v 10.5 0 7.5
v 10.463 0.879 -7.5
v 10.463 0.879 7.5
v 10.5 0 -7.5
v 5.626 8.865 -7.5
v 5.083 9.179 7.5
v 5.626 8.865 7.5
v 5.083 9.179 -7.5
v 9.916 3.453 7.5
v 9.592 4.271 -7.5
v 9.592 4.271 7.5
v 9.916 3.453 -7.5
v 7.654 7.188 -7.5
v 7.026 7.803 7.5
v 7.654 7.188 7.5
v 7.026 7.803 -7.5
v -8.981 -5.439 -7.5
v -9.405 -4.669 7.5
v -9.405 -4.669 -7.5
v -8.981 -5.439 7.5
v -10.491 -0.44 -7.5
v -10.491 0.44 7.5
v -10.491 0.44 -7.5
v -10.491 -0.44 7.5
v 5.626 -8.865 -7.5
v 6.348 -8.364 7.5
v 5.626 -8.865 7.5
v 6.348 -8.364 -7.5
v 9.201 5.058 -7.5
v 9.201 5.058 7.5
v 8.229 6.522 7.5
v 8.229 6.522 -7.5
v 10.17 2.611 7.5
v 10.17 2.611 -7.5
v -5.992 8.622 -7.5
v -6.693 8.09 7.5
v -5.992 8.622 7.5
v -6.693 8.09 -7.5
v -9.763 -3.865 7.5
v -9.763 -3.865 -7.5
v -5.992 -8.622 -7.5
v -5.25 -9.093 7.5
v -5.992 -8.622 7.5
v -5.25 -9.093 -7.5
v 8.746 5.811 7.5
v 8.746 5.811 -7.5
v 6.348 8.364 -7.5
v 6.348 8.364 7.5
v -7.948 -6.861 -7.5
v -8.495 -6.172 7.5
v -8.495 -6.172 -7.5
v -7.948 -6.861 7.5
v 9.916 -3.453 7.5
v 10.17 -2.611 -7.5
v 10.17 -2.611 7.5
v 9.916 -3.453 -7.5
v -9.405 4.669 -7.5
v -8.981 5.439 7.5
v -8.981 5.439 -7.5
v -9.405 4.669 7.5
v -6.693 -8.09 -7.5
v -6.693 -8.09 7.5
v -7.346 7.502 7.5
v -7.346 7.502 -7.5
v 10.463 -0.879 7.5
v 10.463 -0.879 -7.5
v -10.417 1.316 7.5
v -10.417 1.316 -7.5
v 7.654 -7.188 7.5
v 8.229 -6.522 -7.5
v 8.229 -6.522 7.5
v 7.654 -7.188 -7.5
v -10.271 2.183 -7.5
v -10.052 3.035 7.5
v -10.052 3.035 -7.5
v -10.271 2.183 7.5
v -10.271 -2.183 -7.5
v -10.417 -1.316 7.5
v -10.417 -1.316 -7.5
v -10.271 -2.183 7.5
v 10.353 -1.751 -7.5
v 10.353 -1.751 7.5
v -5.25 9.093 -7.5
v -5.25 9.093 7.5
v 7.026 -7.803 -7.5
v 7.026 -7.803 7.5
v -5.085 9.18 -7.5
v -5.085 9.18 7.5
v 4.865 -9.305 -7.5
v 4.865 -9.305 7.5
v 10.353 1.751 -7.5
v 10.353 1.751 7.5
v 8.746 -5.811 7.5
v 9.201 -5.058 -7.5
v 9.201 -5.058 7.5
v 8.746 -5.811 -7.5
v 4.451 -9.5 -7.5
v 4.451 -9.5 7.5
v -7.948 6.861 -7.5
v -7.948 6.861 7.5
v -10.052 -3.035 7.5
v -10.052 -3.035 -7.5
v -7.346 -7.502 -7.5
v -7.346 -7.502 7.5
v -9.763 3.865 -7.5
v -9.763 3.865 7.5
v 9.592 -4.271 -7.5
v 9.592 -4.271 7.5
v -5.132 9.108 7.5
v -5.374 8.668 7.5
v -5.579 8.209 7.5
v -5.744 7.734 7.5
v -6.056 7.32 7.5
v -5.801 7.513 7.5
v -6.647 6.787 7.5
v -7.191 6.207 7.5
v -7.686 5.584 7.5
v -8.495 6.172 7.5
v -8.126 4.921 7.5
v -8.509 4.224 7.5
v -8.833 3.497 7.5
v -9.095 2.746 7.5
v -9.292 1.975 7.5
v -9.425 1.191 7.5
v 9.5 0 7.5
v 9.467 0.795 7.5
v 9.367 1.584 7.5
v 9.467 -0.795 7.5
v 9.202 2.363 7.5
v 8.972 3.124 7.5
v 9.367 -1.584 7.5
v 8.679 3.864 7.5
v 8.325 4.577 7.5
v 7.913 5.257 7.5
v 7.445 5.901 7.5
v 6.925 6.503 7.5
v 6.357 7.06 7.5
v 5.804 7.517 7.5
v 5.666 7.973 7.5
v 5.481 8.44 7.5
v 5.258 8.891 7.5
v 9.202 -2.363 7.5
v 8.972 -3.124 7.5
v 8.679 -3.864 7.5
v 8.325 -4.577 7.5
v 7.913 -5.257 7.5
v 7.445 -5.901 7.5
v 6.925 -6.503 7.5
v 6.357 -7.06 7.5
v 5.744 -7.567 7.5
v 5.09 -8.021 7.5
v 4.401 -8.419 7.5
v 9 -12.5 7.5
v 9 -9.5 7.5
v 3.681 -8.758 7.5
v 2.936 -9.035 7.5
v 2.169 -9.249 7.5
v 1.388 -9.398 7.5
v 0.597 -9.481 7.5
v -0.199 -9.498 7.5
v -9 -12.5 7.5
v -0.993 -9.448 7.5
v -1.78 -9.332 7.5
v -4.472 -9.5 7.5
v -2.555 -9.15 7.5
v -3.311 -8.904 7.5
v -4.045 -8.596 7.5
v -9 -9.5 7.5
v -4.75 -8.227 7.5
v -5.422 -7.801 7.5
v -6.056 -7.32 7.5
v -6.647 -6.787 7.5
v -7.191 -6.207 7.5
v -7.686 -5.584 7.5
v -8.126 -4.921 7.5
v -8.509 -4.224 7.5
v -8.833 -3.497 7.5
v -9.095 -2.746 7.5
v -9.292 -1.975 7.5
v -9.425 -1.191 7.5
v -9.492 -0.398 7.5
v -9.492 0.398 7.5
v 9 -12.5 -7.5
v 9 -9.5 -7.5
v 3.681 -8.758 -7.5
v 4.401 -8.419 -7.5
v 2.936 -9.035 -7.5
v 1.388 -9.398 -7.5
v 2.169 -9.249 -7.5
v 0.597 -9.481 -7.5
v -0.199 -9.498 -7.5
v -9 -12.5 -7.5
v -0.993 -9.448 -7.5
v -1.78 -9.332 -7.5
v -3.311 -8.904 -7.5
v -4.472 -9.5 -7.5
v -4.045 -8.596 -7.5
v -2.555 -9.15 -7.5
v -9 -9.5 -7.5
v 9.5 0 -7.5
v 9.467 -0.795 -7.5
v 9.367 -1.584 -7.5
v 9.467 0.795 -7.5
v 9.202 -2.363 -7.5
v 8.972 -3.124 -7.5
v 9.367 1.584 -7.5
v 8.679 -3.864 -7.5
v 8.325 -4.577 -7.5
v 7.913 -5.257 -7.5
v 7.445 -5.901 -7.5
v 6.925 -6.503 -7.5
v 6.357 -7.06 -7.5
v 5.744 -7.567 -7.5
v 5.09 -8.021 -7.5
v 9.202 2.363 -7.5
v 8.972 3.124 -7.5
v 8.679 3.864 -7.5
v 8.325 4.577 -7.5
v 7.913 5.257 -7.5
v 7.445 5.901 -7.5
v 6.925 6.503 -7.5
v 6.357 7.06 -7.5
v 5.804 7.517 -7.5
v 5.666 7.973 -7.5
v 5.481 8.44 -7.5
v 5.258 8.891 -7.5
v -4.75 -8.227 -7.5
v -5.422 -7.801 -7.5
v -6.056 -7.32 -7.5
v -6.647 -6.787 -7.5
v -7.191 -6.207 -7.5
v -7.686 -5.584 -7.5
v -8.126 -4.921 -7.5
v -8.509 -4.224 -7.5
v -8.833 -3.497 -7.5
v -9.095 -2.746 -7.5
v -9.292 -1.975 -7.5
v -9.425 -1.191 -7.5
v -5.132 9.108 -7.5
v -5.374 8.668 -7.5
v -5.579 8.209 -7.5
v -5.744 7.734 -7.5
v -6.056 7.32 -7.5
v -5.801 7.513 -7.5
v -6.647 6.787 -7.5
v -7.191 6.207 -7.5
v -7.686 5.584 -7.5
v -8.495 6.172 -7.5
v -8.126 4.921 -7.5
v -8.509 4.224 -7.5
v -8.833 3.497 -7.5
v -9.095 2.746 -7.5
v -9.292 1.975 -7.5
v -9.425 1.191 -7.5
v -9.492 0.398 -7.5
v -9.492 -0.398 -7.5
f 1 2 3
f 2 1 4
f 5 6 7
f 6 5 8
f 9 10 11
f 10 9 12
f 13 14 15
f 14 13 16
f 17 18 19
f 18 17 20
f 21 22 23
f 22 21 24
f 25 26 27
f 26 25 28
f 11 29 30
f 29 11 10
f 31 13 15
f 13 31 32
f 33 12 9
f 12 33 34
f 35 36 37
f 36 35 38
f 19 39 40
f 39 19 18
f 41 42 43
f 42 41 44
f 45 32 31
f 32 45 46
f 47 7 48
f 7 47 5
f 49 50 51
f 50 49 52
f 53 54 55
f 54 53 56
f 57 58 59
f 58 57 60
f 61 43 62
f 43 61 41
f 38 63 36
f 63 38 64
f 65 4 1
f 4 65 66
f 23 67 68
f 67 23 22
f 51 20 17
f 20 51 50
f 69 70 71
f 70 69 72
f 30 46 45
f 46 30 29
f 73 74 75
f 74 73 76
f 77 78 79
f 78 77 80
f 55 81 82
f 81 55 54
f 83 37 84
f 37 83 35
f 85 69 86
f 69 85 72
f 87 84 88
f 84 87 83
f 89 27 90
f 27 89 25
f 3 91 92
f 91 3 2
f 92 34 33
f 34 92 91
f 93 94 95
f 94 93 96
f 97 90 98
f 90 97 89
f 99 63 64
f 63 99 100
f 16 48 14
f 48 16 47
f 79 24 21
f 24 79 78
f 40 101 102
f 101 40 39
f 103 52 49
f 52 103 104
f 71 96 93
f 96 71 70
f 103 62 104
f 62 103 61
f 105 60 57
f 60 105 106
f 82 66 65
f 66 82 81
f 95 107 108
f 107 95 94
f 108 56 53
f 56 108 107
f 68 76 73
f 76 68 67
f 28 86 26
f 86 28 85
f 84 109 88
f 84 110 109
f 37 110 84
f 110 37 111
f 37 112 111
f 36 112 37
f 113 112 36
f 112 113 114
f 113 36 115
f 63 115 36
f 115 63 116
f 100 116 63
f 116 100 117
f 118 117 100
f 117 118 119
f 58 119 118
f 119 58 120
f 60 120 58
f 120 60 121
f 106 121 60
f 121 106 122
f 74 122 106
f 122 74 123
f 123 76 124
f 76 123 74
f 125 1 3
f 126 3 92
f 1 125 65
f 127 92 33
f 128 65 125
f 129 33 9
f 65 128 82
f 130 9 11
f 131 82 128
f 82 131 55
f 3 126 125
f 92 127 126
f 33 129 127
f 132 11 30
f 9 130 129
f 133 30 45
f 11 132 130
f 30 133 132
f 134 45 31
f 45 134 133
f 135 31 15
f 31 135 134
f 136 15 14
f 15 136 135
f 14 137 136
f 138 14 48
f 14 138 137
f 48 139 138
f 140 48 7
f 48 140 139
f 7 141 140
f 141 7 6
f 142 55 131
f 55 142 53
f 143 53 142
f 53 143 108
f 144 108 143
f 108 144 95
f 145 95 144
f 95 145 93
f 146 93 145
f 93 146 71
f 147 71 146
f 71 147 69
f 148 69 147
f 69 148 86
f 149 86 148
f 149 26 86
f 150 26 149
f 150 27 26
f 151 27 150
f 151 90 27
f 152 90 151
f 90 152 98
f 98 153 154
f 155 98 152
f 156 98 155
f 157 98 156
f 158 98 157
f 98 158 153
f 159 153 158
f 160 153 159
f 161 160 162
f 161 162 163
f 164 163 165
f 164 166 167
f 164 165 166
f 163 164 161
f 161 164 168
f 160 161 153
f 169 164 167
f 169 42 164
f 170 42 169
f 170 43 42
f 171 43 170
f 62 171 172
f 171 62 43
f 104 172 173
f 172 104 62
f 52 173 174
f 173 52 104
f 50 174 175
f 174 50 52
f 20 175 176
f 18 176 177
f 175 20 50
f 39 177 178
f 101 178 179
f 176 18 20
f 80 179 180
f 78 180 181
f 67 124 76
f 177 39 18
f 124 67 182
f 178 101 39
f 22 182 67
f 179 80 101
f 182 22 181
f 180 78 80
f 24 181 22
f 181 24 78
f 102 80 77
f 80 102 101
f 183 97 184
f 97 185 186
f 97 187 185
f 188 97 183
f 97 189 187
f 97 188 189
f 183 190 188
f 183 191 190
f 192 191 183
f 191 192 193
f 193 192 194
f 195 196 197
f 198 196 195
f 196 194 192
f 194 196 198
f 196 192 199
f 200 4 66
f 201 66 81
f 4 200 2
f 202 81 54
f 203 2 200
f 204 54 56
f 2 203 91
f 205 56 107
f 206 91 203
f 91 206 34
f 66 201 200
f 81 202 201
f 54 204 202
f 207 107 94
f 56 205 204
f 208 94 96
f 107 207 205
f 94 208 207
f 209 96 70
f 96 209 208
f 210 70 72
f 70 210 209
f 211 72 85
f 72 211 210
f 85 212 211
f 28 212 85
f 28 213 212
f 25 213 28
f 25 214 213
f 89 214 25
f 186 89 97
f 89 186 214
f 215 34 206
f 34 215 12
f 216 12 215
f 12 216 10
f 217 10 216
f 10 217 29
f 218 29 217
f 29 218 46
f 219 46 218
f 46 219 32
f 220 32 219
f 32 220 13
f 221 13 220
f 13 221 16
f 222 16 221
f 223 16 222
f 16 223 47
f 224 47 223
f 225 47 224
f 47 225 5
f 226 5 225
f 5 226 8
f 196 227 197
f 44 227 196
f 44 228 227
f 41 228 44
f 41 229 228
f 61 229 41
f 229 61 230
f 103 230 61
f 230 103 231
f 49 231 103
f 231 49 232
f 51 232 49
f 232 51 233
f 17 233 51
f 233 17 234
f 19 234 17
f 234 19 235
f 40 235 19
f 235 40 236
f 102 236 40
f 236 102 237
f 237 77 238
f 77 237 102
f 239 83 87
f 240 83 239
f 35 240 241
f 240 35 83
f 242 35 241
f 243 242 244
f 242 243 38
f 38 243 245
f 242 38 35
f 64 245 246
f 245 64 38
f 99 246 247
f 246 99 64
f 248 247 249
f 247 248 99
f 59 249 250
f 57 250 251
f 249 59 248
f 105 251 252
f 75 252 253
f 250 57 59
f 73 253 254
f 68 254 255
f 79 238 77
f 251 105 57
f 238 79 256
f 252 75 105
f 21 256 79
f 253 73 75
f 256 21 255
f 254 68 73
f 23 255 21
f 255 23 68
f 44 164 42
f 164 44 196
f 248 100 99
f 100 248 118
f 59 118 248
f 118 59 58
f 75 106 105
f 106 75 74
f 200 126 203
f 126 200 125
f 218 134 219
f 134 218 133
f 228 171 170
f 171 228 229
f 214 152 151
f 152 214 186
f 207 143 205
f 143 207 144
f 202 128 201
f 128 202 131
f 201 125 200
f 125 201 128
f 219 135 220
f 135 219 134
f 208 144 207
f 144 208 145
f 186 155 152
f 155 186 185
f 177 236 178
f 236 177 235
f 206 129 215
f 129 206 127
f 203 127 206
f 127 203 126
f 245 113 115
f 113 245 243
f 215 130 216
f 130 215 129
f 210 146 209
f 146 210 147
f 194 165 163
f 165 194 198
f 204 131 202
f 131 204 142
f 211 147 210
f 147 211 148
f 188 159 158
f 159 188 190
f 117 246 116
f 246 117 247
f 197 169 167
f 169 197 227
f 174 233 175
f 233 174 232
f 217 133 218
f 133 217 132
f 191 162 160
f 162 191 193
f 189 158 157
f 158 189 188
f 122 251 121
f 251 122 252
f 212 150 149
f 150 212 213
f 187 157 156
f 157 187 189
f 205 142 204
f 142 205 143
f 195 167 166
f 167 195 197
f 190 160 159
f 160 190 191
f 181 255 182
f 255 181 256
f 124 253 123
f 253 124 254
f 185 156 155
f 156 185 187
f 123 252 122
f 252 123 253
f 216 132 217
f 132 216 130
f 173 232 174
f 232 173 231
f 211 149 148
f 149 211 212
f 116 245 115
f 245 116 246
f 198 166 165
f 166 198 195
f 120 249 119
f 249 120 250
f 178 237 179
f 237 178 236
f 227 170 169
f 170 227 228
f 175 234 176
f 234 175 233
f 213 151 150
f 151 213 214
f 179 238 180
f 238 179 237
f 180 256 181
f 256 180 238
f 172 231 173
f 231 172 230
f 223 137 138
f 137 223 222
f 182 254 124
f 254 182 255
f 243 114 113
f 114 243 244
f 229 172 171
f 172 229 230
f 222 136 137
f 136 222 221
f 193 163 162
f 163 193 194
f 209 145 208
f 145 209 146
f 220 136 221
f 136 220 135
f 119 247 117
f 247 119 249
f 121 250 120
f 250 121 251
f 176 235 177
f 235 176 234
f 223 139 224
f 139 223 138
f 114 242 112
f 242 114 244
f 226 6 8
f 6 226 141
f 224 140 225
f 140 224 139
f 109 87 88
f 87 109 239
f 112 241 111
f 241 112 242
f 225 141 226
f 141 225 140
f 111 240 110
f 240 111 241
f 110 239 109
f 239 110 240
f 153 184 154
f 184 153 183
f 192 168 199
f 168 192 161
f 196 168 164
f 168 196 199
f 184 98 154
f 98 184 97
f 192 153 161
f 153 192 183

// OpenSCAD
$fn = 75;

difference(){
    difference(){
        cylinder(15, d=21, center = true);
        translate([0,0,-1])
        cylinder(20, d=19, center = true);
    }
    translate([0,6,-1])
        cylinder(20, d=12, center = true);
    }
translate([0,-11,0])
    cube([18,3,15], center = true);
